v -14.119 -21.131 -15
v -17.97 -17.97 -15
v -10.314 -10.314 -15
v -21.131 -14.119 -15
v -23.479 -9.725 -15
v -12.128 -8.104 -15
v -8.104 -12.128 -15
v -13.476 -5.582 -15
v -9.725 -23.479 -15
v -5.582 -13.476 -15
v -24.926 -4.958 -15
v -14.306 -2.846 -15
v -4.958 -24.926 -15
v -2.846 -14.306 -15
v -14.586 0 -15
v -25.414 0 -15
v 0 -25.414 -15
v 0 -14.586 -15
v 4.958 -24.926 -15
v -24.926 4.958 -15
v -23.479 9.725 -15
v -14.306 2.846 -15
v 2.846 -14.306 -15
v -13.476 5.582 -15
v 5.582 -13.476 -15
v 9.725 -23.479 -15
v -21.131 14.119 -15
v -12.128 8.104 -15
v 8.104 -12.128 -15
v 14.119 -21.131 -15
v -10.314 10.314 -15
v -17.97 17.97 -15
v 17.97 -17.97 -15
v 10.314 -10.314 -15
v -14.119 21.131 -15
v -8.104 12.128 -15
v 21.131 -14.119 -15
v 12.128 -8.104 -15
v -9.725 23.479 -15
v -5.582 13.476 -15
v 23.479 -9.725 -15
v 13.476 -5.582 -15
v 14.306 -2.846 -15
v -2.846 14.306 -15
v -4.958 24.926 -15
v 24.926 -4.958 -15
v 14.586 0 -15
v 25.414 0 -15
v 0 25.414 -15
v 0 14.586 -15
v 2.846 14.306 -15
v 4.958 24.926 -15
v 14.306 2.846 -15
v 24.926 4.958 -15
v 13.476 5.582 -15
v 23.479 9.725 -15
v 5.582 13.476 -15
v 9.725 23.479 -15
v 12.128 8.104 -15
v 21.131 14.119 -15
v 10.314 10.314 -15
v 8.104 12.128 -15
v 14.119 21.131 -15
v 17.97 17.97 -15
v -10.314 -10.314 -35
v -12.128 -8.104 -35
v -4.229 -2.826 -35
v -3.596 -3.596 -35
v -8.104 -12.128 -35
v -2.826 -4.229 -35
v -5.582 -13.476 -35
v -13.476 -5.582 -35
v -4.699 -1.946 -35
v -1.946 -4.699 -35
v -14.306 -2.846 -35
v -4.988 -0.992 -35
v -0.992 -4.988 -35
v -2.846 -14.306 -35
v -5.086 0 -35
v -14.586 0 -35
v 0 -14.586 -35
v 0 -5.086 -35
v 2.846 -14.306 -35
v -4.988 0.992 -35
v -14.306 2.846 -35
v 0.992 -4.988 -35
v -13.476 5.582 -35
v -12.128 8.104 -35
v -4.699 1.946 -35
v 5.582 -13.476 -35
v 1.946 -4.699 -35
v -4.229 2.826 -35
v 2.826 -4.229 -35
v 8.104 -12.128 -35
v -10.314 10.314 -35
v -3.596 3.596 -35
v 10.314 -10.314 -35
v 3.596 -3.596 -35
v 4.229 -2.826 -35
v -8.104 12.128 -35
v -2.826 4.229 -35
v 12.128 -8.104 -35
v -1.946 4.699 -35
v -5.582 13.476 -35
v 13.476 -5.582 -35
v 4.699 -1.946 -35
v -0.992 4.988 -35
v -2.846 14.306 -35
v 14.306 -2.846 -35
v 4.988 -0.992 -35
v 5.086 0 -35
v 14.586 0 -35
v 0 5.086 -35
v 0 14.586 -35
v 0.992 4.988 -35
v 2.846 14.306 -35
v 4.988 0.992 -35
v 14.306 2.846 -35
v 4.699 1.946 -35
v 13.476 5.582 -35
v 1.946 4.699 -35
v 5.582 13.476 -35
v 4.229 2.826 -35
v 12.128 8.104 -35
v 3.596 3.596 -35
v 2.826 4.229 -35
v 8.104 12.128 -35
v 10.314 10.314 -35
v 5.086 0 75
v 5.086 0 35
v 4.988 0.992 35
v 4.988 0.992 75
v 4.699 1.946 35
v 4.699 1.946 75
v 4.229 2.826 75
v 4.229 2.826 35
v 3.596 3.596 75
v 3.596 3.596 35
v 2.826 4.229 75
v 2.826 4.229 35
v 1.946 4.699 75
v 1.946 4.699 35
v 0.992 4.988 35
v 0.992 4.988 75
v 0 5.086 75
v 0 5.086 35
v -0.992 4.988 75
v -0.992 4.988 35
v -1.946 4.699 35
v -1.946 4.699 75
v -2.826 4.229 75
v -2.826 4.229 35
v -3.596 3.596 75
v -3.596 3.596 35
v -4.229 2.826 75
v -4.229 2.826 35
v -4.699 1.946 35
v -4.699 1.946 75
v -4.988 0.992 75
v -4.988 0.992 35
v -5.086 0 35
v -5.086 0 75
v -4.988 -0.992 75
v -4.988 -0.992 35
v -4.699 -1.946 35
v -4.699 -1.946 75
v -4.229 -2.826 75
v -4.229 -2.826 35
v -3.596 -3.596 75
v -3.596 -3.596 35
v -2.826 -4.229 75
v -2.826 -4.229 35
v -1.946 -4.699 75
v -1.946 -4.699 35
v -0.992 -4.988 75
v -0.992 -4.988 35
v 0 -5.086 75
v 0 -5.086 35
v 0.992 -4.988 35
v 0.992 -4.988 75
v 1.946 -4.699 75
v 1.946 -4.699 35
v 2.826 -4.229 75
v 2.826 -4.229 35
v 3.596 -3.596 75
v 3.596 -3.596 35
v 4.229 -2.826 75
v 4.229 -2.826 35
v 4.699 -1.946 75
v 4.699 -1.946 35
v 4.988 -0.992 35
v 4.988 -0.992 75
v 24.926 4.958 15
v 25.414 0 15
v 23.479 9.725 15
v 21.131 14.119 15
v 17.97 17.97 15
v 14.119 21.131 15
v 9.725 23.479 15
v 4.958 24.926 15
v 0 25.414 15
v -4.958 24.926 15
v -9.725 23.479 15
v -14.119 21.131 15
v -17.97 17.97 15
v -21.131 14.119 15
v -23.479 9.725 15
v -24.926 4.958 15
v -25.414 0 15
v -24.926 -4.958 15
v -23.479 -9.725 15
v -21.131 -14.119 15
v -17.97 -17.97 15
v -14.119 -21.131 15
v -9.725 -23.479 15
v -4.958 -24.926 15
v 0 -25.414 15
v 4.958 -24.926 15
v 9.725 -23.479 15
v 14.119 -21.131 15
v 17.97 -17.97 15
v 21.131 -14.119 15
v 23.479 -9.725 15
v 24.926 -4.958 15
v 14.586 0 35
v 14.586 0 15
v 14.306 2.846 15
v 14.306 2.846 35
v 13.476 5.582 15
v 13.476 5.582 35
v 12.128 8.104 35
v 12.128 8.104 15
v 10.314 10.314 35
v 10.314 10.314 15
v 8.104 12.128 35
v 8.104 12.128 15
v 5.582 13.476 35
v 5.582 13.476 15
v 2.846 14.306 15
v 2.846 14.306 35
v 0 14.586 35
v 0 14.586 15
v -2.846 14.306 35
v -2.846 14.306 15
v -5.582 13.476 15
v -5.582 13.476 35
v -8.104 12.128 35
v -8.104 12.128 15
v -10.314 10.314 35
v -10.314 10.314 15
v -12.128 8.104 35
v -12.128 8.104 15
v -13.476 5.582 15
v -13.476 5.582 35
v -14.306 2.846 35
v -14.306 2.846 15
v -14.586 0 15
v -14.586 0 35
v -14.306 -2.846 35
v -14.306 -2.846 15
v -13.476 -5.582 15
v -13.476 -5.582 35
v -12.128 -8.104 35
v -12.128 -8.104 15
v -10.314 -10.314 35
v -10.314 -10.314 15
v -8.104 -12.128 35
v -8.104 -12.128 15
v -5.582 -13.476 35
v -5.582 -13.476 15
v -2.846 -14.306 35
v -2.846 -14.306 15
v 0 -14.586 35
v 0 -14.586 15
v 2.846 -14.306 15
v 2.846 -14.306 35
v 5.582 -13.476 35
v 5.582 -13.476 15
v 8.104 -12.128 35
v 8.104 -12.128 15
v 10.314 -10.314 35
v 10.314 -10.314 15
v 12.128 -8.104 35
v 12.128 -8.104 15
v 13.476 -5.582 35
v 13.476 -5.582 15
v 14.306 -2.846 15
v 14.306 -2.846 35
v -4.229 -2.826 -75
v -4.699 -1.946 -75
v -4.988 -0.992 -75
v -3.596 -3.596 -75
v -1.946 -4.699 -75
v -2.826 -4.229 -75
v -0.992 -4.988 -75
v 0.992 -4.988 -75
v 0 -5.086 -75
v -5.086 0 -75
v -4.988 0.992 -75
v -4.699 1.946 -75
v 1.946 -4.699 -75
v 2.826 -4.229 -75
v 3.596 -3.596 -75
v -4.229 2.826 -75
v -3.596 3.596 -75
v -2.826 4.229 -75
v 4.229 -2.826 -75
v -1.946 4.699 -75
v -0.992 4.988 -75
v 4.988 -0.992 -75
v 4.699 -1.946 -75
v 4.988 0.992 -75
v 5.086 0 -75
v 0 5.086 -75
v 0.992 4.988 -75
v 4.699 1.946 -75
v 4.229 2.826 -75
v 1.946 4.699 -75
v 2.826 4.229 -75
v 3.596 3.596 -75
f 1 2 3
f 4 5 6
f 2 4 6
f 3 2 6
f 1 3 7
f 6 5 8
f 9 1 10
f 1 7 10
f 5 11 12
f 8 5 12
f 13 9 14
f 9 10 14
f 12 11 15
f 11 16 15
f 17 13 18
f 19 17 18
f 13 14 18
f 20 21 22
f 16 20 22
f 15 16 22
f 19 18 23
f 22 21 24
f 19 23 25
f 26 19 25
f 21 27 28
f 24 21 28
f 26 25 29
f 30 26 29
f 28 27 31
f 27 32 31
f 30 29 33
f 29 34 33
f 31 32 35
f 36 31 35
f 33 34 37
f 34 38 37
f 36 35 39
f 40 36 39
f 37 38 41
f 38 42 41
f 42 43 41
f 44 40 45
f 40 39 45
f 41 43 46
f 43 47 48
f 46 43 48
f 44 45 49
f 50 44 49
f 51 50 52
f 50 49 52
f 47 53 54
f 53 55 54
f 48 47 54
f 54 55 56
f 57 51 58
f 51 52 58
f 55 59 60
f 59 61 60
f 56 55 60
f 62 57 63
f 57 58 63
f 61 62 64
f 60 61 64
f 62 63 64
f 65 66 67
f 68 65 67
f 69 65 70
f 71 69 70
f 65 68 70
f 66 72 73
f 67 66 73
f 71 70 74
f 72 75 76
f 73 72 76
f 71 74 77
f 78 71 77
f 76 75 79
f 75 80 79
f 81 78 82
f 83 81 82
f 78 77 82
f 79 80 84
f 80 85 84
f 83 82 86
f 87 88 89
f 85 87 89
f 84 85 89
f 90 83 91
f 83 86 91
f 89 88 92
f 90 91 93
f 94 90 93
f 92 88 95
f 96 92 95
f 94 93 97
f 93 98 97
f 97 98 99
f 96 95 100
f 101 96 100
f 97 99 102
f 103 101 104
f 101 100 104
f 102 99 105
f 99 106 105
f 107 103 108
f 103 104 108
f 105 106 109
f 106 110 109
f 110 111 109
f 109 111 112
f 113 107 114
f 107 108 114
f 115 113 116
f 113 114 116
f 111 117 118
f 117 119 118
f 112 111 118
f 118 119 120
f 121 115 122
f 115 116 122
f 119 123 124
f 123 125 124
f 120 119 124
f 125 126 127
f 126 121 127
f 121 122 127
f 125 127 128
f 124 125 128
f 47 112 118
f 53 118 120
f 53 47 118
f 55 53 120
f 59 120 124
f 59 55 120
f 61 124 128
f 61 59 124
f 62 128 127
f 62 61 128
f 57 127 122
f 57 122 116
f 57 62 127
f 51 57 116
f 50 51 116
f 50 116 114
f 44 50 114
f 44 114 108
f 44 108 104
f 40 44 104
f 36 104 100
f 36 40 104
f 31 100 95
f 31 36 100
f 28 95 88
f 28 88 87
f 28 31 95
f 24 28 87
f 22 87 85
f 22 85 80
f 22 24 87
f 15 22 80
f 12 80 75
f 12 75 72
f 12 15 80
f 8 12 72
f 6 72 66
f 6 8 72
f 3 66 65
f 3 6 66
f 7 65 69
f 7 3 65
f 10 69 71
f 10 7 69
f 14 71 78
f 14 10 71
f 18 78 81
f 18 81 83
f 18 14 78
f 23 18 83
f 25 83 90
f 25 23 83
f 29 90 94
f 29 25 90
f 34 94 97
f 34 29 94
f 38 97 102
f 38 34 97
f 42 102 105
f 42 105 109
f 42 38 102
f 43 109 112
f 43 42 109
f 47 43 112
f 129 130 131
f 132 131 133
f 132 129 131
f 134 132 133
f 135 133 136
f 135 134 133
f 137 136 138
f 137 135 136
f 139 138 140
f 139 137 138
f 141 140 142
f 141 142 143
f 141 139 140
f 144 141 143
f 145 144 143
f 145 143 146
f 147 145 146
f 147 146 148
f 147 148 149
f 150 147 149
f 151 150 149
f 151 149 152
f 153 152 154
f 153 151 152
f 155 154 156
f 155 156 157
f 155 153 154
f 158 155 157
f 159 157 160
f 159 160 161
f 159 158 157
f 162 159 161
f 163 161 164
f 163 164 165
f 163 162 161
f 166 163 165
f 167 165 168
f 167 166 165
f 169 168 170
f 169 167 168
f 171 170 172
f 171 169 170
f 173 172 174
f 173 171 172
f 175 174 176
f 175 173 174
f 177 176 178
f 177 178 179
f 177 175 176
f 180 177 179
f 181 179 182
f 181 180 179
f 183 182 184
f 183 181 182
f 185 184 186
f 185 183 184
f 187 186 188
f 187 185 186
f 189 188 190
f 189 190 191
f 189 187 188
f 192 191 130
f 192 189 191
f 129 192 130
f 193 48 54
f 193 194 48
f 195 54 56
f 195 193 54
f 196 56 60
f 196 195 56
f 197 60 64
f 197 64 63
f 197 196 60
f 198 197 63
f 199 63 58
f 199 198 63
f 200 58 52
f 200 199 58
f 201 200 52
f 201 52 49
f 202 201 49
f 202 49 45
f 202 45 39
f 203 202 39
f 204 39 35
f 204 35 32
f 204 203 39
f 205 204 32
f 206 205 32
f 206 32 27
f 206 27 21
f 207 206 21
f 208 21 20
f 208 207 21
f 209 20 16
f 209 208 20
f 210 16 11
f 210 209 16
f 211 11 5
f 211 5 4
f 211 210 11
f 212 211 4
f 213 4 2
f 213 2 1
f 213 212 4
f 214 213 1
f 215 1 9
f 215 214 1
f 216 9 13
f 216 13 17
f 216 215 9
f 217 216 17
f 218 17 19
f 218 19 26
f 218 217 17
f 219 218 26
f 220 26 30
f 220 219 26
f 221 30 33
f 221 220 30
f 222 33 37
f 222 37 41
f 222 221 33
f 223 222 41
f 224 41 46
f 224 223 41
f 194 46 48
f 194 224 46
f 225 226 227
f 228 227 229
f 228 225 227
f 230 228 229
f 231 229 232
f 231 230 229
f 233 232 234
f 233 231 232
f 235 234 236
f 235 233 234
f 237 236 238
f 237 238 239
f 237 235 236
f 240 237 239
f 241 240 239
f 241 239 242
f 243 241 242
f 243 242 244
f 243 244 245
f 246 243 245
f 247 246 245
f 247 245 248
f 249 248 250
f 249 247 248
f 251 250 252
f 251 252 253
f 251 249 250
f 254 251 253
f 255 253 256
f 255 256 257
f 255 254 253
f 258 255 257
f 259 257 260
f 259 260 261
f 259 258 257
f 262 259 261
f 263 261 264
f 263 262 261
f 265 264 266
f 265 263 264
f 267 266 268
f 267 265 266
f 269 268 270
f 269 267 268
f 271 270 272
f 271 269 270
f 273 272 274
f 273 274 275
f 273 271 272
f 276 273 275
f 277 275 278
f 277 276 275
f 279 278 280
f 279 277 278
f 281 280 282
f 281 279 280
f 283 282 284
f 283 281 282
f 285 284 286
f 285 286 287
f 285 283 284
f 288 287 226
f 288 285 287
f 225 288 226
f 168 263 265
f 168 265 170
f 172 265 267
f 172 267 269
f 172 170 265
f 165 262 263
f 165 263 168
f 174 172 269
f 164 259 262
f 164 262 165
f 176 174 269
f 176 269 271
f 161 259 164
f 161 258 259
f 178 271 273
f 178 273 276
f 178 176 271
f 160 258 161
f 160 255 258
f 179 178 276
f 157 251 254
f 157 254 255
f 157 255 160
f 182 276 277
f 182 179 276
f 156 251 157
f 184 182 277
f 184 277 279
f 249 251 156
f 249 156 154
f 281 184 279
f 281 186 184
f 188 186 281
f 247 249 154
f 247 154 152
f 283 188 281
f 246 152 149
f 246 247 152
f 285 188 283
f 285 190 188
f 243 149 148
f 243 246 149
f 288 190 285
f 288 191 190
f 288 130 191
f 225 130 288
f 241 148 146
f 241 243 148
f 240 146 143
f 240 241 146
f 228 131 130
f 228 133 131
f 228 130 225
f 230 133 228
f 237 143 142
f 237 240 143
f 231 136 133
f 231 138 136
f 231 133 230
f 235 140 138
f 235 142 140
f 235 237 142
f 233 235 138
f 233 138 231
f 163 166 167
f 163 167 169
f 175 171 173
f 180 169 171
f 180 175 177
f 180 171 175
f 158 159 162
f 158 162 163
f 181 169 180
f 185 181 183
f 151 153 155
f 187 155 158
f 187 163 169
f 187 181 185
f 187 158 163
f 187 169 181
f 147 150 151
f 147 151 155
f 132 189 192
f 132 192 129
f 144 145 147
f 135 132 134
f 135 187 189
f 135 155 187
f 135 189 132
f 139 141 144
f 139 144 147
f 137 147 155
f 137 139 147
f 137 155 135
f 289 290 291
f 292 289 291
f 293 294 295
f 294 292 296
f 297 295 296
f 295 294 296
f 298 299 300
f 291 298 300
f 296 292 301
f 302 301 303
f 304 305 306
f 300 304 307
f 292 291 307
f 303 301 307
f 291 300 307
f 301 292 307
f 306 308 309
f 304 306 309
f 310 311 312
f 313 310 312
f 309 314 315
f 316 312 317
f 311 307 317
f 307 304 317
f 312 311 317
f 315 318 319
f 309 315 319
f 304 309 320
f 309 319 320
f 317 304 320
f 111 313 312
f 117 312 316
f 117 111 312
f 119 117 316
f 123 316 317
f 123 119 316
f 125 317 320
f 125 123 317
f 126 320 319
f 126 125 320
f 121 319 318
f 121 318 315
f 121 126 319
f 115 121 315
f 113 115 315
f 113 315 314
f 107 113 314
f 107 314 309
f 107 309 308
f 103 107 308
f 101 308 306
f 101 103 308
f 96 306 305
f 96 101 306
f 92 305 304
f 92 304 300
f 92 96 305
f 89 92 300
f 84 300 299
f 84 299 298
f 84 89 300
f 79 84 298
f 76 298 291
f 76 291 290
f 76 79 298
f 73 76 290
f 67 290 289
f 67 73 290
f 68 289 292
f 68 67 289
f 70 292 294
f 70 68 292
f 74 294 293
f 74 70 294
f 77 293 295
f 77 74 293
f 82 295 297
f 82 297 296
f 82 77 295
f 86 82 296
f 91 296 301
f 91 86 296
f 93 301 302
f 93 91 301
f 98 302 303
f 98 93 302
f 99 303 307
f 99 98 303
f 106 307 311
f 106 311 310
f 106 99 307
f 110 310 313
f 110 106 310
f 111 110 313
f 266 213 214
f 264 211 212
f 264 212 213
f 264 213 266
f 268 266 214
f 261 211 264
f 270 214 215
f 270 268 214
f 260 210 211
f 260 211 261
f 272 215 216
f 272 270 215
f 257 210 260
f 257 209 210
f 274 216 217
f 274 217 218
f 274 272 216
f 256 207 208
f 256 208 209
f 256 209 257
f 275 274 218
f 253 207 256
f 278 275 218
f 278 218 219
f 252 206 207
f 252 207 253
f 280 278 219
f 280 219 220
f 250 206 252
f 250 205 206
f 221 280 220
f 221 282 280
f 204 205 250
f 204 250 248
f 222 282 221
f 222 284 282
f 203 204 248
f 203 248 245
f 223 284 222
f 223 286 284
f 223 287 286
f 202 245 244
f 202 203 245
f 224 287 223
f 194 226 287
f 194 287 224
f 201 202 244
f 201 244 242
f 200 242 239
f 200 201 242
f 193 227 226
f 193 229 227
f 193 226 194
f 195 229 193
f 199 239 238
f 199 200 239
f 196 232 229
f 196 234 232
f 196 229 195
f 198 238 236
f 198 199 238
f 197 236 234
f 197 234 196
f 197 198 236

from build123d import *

# Parameters (mm, degrees)
F0_R     = 5.085856
F1_DEPTH = 75
F0_R_2   = 14.586224
F2_DEPTH = 35
F0_R_3   = 25.413883
F3_DEPTH = 15


with BuildPart() as f1:
    # F0 (on Top) → F1 (new body, symmetric)
    with BuildSketch(Plane.XY):
        Circle(F0_R)
    extrude(amount=F1_DEPTH, both=True)

    # F0 (on Top) → F2 (join, symmetric)
    with BuildSketch(Plane.XY):
        Circle(F0_R_2)
        Circle(F0_R, mode=Mode.SUBTRACT)
    extrude(amount=F2_DEPTH, both=True)

    # F0 (on Top) → F3 (join, symmetric)
    with BuildSketch(Plane.XY):
        Circle(F0_R_3)
        Circle(F0_R_2, mode=Mode.SUBTRACT)
    extrude(amount=F3_DEPTH, both=True)


solid = f1.part
